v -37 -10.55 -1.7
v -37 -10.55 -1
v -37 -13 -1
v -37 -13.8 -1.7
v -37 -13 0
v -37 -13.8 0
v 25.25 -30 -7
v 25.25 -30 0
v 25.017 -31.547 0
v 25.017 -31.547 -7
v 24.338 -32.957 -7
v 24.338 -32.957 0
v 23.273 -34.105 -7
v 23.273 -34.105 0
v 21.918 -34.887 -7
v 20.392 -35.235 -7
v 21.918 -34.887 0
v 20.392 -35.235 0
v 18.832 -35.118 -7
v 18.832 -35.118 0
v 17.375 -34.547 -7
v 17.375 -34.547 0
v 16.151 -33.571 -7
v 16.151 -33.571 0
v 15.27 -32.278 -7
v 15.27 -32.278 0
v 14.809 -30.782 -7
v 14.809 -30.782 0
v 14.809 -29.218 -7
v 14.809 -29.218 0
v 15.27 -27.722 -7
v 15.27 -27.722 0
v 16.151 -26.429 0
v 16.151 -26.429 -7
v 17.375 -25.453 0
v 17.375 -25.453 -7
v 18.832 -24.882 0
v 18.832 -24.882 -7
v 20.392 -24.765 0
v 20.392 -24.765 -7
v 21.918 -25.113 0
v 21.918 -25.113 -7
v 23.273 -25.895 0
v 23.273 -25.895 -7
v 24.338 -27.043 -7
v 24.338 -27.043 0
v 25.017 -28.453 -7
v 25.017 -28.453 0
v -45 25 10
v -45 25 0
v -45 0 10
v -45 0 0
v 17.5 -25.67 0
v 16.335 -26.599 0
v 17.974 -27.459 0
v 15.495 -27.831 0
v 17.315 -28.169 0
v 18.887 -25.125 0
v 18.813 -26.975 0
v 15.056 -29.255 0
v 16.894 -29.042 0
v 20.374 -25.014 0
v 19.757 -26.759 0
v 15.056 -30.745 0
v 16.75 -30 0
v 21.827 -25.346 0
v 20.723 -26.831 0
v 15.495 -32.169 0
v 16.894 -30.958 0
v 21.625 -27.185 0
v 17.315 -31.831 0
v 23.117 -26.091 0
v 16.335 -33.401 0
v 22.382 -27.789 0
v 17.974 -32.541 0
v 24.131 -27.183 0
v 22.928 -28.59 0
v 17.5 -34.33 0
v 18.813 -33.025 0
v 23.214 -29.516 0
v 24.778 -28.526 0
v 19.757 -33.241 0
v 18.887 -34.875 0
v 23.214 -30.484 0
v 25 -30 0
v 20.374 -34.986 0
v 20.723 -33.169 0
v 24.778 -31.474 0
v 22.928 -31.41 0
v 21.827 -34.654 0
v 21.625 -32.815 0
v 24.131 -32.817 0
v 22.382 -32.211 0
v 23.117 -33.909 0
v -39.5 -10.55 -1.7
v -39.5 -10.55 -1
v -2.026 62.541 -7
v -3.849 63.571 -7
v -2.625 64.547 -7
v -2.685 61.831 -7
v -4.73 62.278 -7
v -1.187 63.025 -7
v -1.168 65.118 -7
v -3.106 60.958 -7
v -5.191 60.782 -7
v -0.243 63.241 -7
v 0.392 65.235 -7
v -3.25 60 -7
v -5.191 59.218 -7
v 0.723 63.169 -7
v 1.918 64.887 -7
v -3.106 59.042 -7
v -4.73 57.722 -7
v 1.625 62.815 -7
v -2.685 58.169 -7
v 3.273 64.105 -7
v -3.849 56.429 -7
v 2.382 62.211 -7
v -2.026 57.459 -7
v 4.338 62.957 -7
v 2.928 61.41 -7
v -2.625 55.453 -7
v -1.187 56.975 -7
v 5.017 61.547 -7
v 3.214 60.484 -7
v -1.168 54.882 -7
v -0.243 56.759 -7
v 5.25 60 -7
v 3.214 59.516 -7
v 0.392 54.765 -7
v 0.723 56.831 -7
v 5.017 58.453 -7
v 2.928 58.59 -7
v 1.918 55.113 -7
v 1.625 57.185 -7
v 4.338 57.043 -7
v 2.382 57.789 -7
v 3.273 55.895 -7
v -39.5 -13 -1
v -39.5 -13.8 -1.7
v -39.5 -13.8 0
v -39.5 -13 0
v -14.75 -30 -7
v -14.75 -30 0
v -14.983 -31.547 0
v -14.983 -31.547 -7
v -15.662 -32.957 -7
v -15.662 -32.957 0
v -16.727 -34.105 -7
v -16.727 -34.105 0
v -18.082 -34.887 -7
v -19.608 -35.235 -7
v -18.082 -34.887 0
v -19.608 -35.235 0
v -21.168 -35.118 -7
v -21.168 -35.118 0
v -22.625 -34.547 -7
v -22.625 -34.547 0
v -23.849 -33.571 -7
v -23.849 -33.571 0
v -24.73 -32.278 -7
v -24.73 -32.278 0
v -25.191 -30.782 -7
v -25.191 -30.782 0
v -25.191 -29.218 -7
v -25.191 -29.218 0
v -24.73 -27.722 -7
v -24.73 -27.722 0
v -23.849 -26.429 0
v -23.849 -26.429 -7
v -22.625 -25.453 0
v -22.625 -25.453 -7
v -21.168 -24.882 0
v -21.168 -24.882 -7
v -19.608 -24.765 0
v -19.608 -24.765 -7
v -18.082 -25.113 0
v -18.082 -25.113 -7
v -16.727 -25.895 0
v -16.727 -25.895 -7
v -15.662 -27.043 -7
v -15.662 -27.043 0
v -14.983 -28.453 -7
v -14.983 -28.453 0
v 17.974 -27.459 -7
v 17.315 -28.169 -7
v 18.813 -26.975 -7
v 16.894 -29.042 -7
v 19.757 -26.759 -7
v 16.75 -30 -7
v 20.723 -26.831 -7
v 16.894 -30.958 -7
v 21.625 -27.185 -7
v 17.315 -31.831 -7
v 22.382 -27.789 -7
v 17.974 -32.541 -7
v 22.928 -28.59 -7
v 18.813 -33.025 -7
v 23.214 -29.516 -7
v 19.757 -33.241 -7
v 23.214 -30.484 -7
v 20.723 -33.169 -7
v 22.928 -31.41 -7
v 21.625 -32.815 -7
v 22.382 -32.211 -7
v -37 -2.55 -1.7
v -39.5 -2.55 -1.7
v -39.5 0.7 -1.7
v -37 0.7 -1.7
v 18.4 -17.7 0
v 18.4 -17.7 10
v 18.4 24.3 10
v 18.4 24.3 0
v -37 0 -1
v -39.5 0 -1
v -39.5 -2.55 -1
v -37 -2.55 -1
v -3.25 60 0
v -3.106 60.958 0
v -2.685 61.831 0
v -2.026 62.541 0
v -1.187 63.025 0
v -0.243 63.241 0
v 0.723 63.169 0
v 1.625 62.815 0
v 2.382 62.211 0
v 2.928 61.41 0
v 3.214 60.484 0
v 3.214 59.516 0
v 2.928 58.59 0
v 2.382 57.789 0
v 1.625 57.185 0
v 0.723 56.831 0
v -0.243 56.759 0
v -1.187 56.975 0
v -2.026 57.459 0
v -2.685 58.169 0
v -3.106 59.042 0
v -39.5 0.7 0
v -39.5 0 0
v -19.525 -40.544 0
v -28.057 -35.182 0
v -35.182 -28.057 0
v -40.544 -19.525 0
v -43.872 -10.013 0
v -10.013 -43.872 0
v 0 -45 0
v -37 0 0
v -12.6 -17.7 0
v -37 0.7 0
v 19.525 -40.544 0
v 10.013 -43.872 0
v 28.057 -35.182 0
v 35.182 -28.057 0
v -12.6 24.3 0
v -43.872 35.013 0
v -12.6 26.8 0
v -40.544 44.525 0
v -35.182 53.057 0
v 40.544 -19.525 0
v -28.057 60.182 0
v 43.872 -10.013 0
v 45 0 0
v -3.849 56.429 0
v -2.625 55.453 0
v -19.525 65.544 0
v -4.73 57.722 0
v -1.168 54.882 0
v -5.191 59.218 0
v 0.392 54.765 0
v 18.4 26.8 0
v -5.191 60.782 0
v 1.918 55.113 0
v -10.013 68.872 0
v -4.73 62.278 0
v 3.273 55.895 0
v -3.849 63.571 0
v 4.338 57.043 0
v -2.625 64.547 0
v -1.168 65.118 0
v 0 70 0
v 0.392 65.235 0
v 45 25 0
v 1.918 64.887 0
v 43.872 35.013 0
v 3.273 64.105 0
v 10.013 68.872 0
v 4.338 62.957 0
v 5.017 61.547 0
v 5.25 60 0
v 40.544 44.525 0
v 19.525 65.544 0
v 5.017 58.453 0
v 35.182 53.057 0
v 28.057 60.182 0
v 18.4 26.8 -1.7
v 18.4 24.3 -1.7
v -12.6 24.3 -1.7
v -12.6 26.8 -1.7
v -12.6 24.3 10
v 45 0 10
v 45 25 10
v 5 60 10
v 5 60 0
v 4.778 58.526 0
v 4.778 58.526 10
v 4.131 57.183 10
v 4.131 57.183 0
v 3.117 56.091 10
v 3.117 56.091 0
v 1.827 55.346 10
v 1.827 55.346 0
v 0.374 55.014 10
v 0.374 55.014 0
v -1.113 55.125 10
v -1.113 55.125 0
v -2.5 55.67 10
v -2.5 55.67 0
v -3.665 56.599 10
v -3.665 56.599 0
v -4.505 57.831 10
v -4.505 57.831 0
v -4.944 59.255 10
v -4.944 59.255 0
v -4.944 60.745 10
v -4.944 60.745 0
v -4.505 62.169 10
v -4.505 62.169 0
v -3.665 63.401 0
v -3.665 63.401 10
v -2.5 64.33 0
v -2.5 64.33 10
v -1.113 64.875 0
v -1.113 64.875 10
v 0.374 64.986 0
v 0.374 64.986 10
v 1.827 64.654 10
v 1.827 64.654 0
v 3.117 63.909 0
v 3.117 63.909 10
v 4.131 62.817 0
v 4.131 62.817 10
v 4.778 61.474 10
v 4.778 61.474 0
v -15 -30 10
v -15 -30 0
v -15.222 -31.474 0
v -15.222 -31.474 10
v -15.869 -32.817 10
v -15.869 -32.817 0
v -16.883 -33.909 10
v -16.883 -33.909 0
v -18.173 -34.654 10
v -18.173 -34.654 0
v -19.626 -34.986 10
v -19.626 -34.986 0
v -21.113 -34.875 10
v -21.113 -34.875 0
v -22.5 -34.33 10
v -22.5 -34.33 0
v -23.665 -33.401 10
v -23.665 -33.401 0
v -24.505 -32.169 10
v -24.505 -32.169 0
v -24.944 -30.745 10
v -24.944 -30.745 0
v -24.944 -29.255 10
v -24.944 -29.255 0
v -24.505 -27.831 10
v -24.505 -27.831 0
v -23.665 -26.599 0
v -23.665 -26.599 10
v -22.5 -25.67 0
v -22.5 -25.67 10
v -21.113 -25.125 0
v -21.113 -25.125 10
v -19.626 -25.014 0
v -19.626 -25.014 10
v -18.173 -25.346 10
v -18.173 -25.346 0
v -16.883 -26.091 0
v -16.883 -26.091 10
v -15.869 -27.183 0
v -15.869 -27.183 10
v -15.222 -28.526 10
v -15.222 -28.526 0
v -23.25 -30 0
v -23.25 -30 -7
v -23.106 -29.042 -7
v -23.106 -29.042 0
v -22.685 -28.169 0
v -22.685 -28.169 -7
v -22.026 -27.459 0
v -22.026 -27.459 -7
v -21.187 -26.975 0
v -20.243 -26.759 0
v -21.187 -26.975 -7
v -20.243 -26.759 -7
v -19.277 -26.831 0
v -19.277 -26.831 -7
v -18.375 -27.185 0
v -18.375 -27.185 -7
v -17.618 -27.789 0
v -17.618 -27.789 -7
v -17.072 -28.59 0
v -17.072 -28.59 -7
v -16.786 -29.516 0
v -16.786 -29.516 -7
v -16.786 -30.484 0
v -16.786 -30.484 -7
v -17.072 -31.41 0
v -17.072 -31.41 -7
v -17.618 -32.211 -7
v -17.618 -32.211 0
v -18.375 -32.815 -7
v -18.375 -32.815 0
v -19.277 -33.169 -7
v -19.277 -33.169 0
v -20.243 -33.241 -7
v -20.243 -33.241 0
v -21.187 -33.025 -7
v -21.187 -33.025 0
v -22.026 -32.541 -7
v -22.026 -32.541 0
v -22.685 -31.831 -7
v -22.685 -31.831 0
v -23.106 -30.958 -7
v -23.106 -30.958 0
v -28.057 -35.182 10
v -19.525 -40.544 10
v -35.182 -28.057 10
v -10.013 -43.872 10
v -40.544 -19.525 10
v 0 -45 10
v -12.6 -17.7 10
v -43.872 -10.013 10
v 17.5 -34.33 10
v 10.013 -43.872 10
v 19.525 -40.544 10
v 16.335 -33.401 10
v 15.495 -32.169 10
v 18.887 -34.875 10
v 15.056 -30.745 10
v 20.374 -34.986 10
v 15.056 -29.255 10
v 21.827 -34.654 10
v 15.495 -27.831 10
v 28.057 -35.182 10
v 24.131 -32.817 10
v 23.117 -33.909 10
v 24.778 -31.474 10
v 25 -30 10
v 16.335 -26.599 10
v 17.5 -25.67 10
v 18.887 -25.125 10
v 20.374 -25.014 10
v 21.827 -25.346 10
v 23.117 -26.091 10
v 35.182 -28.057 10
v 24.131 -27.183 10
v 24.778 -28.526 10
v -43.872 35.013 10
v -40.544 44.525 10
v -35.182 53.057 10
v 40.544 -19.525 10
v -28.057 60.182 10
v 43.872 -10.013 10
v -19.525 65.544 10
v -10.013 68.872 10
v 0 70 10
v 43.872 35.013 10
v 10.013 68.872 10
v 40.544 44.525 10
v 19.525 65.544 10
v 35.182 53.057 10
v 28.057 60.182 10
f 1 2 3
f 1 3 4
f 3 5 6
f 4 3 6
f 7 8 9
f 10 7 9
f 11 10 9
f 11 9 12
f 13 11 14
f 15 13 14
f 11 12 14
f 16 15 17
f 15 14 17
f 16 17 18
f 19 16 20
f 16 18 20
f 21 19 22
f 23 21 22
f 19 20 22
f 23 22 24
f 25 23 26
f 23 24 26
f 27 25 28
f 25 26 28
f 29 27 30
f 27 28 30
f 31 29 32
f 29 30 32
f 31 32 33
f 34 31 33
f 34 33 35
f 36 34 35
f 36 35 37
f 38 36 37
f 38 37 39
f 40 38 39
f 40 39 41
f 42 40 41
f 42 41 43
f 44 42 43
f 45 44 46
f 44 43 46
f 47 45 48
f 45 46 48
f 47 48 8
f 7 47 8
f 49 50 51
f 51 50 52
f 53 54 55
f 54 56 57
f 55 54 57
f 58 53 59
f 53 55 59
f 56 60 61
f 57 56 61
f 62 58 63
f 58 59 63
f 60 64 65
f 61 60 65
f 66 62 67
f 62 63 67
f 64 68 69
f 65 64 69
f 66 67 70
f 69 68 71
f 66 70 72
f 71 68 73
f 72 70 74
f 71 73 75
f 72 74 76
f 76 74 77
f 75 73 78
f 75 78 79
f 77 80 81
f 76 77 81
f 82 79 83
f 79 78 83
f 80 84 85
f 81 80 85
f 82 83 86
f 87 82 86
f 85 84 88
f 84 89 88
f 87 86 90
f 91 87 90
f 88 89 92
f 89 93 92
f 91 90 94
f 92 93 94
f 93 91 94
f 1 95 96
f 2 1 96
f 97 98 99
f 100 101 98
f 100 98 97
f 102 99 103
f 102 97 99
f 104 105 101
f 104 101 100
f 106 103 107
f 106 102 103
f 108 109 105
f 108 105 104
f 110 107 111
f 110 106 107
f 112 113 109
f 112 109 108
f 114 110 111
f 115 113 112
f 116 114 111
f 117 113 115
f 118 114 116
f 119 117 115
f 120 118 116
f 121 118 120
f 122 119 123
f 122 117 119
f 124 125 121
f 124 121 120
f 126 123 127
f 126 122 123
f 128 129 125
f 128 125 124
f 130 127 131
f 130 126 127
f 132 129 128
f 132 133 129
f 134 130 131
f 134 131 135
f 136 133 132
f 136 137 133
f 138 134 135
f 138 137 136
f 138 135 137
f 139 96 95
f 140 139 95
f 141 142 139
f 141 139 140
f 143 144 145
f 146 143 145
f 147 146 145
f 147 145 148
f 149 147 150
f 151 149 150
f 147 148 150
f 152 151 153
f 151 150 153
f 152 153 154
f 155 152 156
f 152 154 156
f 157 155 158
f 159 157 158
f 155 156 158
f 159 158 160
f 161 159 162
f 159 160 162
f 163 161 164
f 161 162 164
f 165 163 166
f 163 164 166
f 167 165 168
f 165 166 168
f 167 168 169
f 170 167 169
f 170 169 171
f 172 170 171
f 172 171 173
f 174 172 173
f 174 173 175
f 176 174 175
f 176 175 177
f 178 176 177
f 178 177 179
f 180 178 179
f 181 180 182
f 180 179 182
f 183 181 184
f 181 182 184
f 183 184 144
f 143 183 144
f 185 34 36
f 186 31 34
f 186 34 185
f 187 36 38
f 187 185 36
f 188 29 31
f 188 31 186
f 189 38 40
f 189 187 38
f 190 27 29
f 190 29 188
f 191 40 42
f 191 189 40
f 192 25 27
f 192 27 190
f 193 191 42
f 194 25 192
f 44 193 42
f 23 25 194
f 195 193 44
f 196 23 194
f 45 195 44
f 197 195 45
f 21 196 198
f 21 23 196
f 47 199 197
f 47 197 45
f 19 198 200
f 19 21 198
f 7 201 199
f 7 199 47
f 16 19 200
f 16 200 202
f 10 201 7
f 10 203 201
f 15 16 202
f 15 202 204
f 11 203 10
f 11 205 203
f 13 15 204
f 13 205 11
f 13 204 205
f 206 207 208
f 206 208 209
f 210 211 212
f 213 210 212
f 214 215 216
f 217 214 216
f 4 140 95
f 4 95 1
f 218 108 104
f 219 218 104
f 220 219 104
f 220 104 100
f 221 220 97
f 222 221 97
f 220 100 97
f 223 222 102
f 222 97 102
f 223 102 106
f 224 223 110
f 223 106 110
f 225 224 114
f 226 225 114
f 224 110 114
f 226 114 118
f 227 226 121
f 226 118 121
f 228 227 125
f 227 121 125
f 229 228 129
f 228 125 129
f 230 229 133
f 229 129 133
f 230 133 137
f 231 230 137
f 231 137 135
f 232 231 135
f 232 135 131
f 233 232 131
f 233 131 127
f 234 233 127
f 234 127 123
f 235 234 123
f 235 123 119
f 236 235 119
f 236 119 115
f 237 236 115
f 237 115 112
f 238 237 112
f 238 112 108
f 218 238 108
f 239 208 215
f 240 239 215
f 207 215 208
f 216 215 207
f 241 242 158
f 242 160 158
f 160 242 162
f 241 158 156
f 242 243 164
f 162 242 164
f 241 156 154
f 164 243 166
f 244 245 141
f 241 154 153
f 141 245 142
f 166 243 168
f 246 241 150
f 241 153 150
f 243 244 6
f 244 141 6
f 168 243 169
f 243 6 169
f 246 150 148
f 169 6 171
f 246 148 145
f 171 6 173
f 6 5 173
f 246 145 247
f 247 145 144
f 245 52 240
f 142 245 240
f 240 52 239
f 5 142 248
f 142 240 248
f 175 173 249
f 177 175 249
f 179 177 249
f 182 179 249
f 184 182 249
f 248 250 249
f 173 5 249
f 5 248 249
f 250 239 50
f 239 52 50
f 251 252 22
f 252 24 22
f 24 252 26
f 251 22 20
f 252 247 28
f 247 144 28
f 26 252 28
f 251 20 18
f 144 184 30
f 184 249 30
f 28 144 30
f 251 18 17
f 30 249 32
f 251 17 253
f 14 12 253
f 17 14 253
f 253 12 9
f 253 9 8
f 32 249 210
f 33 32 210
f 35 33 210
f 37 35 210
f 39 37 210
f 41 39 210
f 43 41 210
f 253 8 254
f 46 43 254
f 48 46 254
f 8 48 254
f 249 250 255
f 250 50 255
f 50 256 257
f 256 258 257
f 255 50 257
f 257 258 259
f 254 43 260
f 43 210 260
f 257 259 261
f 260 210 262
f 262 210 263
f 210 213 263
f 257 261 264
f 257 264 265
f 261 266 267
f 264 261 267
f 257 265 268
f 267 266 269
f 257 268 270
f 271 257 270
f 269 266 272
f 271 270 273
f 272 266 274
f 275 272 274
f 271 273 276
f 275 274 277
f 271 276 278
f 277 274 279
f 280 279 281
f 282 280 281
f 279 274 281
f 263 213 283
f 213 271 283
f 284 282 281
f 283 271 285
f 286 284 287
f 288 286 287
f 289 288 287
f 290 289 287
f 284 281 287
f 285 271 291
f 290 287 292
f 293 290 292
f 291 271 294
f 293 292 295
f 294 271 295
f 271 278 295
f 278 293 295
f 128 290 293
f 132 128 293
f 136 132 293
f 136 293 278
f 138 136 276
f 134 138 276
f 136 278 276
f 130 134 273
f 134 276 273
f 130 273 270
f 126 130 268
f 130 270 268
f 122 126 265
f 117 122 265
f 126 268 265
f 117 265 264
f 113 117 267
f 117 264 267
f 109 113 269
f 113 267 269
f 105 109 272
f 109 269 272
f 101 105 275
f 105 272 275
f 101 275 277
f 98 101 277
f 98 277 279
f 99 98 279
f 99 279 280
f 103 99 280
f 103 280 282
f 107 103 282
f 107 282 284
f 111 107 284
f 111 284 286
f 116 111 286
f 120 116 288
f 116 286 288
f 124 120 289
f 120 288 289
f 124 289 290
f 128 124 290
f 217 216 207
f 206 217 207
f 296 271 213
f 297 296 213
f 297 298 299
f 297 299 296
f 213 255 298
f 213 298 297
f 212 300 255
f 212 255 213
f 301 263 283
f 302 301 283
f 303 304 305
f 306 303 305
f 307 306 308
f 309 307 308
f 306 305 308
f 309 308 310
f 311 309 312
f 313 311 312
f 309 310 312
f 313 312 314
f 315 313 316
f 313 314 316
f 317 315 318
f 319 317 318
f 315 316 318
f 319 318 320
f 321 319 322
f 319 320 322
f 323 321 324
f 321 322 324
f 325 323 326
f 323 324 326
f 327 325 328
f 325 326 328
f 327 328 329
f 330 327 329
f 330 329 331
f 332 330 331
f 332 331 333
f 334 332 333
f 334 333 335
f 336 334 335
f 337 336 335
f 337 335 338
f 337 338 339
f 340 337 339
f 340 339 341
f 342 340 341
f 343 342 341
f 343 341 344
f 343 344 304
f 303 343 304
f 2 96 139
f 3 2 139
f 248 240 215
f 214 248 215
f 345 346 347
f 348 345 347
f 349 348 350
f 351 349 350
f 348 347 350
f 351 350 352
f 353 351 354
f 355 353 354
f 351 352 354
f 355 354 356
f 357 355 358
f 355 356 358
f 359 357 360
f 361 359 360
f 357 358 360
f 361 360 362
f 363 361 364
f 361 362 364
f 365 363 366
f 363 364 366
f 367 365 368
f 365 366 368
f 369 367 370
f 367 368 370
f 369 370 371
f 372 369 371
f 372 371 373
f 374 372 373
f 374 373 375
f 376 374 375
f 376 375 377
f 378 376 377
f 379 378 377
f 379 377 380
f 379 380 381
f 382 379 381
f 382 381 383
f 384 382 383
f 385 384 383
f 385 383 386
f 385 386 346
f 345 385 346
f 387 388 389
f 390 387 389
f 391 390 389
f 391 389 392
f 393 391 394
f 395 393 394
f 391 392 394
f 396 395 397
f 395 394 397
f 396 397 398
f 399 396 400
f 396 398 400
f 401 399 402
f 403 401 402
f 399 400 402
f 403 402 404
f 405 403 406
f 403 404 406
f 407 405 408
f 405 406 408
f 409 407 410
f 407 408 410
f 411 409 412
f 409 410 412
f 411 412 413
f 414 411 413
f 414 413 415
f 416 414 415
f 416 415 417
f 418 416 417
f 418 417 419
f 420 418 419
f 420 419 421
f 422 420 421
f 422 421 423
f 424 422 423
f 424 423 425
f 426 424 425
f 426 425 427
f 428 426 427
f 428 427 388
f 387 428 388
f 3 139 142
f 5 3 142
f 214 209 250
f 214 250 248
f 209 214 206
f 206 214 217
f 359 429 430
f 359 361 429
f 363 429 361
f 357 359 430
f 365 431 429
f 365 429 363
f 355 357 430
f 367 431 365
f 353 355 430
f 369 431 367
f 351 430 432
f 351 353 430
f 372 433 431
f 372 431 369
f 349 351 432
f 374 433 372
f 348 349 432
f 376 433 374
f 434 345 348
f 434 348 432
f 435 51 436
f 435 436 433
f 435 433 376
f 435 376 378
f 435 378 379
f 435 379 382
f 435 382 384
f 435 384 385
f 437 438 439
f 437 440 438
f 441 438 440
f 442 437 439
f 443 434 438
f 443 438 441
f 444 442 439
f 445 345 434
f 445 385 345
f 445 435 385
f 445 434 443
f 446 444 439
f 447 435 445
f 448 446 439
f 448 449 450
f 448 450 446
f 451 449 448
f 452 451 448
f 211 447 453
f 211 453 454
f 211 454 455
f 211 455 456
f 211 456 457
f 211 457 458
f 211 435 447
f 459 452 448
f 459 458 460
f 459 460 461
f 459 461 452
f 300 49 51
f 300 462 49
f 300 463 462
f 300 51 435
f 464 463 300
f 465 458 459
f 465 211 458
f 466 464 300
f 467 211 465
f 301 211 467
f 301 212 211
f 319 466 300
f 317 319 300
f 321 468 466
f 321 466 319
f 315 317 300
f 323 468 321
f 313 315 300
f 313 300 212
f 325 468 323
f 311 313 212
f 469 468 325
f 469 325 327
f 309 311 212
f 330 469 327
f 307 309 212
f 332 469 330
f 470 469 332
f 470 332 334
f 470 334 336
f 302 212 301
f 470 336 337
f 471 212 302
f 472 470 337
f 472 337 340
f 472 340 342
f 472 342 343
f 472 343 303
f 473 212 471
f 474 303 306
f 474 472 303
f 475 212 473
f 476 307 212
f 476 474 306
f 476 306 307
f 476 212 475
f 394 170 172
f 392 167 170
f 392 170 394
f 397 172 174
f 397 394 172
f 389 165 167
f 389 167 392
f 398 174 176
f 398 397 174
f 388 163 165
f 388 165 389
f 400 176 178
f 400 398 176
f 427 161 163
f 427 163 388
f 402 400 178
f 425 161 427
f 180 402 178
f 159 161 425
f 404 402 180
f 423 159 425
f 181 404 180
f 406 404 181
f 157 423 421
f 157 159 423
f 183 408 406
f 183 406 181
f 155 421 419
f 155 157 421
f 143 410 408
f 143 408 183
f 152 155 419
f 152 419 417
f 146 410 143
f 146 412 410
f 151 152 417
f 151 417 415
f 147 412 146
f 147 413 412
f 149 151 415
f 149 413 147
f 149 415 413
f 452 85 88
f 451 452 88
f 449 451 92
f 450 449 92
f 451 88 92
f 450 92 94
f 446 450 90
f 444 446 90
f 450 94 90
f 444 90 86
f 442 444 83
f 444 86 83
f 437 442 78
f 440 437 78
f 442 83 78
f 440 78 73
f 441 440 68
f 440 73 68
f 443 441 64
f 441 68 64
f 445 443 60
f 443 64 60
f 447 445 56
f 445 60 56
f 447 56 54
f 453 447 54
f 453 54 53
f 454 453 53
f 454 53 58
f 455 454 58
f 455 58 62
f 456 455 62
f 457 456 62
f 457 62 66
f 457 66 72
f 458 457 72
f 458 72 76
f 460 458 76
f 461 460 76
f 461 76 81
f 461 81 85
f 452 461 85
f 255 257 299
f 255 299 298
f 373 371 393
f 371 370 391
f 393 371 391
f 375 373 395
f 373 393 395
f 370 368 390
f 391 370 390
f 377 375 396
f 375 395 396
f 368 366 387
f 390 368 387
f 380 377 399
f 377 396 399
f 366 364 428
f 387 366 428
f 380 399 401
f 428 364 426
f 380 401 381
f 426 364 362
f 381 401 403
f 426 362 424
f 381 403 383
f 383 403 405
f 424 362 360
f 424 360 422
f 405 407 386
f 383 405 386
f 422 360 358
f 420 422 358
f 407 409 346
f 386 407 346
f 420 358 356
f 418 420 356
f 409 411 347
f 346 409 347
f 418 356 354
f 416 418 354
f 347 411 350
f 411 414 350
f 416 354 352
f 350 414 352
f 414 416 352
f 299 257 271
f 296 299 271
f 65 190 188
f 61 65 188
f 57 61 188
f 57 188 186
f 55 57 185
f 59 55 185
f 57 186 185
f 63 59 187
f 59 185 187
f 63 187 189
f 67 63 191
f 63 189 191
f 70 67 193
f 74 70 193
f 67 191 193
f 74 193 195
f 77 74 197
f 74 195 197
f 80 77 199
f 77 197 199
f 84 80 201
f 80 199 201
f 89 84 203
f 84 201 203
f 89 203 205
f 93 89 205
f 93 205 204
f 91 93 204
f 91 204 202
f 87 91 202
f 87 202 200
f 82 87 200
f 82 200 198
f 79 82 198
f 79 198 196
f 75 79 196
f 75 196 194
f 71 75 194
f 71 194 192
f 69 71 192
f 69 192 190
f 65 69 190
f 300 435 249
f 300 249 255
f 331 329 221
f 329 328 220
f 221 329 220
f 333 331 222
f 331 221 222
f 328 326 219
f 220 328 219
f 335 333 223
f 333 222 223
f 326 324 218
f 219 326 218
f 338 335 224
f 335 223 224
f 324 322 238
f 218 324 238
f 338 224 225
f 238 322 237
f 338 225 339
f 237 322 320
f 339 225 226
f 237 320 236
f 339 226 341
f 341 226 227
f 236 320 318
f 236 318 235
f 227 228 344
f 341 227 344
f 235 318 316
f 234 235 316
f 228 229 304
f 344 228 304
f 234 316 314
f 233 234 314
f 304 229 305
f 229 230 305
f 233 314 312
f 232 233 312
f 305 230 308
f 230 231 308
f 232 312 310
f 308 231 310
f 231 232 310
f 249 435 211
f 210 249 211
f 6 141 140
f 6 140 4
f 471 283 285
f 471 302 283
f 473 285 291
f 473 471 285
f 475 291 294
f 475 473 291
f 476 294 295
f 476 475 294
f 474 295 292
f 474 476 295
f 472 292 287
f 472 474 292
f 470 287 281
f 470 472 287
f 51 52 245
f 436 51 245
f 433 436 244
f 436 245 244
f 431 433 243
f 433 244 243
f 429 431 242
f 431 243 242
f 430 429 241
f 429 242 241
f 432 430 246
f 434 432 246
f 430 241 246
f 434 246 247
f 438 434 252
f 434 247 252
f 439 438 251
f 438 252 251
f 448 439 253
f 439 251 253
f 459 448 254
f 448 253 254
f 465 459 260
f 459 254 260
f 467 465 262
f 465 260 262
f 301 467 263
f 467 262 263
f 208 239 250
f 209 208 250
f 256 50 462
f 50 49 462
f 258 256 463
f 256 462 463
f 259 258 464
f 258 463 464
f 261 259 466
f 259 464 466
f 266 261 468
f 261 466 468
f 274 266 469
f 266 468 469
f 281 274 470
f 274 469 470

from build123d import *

# Parameters (mm, degrees)
F1_DEPTH    = 10
F3_R        = 44.99999
F4_W        = 31
F4_H        = 42
F5_DEPTH    = 11
F6_R        = 5.25
F7_DEPTH    = 7
F9_D        = 10
F9_DEPTH    = 10.001
F10_D       = 6.5
F10_ON_F6_D = 6.5
F11_W       = 31
F11_H       = 2.5
F12_DEPTH   = 1.7
F13_W       = 2.5
F13_H       = 14.5
F14_DEPTH   = 1.7
F16_DEPTH   = 25


# Not quite as in the source:
# - a fillet or chamfer is up to 0.001 mm smaller than in the source, because OpenCascade refuses the exact size


with BuildPart() as f1:
    # F0 (on Top) → F1 (new body)
    with BuildSketch(Plane.XY):
        with BuildLine():
            Line((-45, 70), (-45, 0))
            ThreePointArc((-45, 0), (0, -45), (45, 0))
            Line((45, 0), (45, 70))
            Line((45, 70), (-45, 70))
        make_face()
    extrude(amount=F1_DEPTH)

    # F3 (radius 45 in the source; OpenCascade refuses exactly that, so slightly less here)
    f3_edges = [f1.edges().sort_by_distance(p)[0] for p in [
        (-45, 70, 5),
        (45, 70, 5),
    ]]
    fillet(f3_edges, radius=F3_R)

    # F4 (on face) → F5 (cut)
    with BuildSketch(Plane.XY.offset(10)):
        with Locations((2.9, 3.3)):
            Rectangle(F4_W, F4_H)
    extrude(amount=-F5_DEPTH, mode=Mode.SUBTRACT)

    # F6 (on face) → F7 (join)
    with BuildSketch(Plane(origin=(0, 0, 0), x_dir=(1, 0, 0), z_dir=(0, 0, -1))):
        with Locations((0, -60)):
            Circle(F6_R)
        with Locations((-20, 30)):
            Circle(F6_R)
        with Locations((20, 30)):
            Circle(F6_R)
    extrude(amount=F7_DEPTH)

    # F9 (through all, one way)
    with BuildSketch(Plane(origin=(0, 0, 0), x_dir=(1, 0, 0), z_dir=(0, 0, -1))):
        with Locations((-20, 30), (20, 30), (0, -60)):
            Circle(F9_D / 2)
    extrude(amount=-F9_DEPTH, mode=Mode.SUBTRACT)

    # F10 (through all)
    with Locations(Plane.XY):
        with Locations((20, -30), (0, 60)):
            Hole(F10_D / 2)

    # F10 on F6 (through all)
    with Locations(Plane.XY):
        with Locations((-20, -30)):
            Hole(F10_ON_F6_D / 2)

    # F11 (on face) → F12 (join)
    with BuildSketch(Plane(origin=(0, 0, 0), x_dir=(1, 0, 0), z_dir=(0, 0, -1))):
        with Locations((2.9, -25.55)):
            Rectangle(F11_W, F11_H)
    extrude(amount=F12_DEPTH)

    # F13 (on face) → F14 (join)
    with BuildSketch(Plane(origin=(0, 0, 0), x_dir=(1, 0, 0), z_dir=(0, 0, -1))):
        with Locations((-38.25, 6.55)):
            Rectangle(F13_W, F13_H)
    extrude(amount=F14_DEPTH)

    # F15 (on face) → F16 (cut)
    with BuildSketch(Plane(origin=(-39.5, 0, 0), x_dir=(0, -1, 0), z_dir=(-1, 0, 0))):
        Polygon((13, -1), (13, 0), (0, 0), (0, -1), (2.55, -1), (2.55, -1.7), (10.55, -1.7), (10.55, -1), align=None)
    extrude(amount=-F16_DEPTH, mode=Mode.SUBTRACT)


solid = f1.part
